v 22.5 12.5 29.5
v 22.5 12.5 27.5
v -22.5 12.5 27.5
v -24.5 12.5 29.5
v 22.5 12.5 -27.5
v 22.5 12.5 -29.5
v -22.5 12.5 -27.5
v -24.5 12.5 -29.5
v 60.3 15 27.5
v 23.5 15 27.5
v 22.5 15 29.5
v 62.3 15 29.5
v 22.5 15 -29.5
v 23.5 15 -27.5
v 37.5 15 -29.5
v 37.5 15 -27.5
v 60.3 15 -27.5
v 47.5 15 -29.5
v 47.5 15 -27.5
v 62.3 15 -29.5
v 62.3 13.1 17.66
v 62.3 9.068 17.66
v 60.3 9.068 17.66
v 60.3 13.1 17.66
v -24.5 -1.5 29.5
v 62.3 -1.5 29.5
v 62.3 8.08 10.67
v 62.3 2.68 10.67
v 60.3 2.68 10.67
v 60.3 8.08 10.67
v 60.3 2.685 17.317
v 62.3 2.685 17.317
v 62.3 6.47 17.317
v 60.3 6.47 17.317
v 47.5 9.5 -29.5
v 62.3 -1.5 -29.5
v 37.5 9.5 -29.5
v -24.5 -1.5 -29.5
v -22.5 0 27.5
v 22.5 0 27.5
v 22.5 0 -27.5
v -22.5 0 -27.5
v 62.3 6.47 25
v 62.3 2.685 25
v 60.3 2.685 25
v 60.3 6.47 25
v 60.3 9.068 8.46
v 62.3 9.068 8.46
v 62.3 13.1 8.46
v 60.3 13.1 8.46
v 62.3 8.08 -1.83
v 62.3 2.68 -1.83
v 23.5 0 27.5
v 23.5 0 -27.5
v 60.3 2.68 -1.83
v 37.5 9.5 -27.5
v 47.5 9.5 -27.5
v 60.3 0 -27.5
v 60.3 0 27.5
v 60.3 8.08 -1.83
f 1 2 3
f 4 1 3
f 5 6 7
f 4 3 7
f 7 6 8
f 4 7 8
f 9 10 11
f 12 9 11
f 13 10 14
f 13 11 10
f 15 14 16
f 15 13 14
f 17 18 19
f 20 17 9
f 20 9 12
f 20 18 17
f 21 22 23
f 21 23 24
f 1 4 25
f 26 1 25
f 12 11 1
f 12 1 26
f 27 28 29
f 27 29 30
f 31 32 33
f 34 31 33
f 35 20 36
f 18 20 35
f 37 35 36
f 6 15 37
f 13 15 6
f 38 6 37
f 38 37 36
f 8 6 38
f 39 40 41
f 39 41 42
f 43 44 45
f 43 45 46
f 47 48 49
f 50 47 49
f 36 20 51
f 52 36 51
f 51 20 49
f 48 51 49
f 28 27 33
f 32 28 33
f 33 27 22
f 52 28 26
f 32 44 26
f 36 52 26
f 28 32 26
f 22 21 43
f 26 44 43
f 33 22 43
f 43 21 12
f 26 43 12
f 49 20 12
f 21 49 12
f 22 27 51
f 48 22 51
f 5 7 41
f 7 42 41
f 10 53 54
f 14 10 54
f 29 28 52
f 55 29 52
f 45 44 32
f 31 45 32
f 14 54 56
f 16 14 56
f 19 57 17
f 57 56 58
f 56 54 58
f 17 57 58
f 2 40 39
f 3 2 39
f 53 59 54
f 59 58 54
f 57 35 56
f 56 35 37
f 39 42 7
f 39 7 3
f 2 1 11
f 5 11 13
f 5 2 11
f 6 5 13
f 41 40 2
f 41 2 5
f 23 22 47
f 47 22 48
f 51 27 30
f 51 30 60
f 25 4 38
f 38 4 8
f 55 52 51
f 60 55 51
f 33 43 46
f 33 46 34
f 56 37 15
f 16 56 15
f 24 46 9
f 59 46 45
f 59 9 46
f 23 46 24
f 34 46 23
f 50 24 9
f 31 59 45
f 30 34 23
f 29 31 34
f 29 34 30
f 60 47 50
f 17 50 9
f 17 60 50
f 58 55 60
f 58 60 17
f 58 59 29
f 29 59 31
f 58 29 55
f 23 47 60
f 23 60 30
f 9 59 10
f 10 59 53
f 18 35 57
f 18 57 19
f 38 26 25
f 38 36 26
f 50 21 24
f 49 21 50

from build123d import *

# Parameters (mm, degrees)
BOSS_EXTRUDE1_DEPTH = 12.5
BOSS_EXTRUDE2_DEPTH = 15
SKETCH1_7_W         = 1
SKETCH1_7_H         = 55
BOSS_EXTRUDE3_DEPTH = 15
SKETCH1_10_W        = 86.8
SKETCH1_10_H        = 59
BOSS_EXTRUDE5_DEPTH = 1.5
SKETCH2_W           = 7.6828
SKETCH2_H           = 3.785279572
SKETCH2_W_2         = 12.5
SKETCH2_H_2         = 5.4
SKETCH2_W_3         = 9.2
SKETCH2_H_3         = 4.03174267
CUT_EXTRUDE1_DEPTH  = 10
SKETCH3_W           = 10
SKETCH3_H           = 5.5
CUT_EXTRUDE2_DEPTH  = 10


with BuildPart() as part:
    # Sketch1 → Boss-Extrude1 (new body)
    with BuildSketch(Plane(origin=(0, 0, 0), x_dir=(1, 0, 0), z_dir=(0, 1, 0))):
        Polygon((22.5, -29.5), (22.5, -27.5), (-22.5, -27.5), (-22.5, 27.5), (22.5, 27.5), (22.5, 29.5), (-24.5, 29.5), (-24.5, -29.5), align=None)
    extrude(amount=BOSS_EXTRUDE1_DEPTH)

    # Sketch1<5> → Boss-Extrude2 (add)
    with BuildSketch(Plane(origin=(0, 0, 0), x_dir=(1, 0, 0), z_dir=(0, 1, 0))):
        Polygon((23.5, -27.5), (22.5, -27.5), (22.5, -29.5), (23.5, -29.5), (62.3, -29.5), (62.3, 29.5), (23.5, 29.5), (22.5, 29.5), (22.5, 27.5), (23.5, 27.5), (60.3, 27.5), (60.3, -27.5), align=None)
    extrude(amount=BOSS_EXTRUDE2_DEPTH)

    # Sketch1<7> → Boss-Extrude3 (add)
    with BuildSketch(Plane(origin=(0, 0, 0), x_dir=(1, 0, 0), z_dir=(0, 1, 0))):
        with Locations((23, 0)):
            Rectangle(SKETCH1_7_W, SKETCH1_7_H)
    extrude(amount=BOSS_EXTRUDE3_DEPTH)

    # Sketch1<10> → Boss-Extrude5 (add)
    with BuildSketch(Plane(origin=(0, 0, 0), x_dir=(1, 0, 0), z_dir=(0, 1, 0))):
        with Locations((18.9, 0)):
            Rectangle(SKETCH1_10_W, SKETCH1_10_H)
    extrude(amount=-BOSS_EXTRUDE5_DEPTH)

    # Sketch2 → Cut-Extrude1 (cut)
    with BuildSketch(Plane(origin=(62.3, 0, 0), x_dir=(0, 0, -1), z_dir=(1, 0, 0))):
        with Locations((-21.1586, 4.57741645)):
            Rectangle(SKETCH2_W, SKETCH2_H)
        with Locations((-4.4202, 5.380056236)):
            Rectangle(SKETCH2_W_2, SKETCH2_H_2)
        with Locations((-13.060208334, 11.084128665)):
            Rectangle(SKETCH2_W_3, SKETCH2_H_3)
    extrude(amount=-CUT_EXTRUDE1_DEPTH, mode=Mode.SUBTRACT)

    # Sketch3 → Cut-Extrude2 (cut)
    with BuildSketch(Plane(origin=(0, 0, -29.5), x_dir=(-1, 0, 0), z_dir=(0, 0, -1))):
        with Locations((-42.5, 12.25)):
            Rectangle(SKETCH3_W, SKETCH3_H)
    extrude(amount=-CUT_EXTRUDE2_DEPTH, mode=Mode.SUBTRACT)


solid = part.part
